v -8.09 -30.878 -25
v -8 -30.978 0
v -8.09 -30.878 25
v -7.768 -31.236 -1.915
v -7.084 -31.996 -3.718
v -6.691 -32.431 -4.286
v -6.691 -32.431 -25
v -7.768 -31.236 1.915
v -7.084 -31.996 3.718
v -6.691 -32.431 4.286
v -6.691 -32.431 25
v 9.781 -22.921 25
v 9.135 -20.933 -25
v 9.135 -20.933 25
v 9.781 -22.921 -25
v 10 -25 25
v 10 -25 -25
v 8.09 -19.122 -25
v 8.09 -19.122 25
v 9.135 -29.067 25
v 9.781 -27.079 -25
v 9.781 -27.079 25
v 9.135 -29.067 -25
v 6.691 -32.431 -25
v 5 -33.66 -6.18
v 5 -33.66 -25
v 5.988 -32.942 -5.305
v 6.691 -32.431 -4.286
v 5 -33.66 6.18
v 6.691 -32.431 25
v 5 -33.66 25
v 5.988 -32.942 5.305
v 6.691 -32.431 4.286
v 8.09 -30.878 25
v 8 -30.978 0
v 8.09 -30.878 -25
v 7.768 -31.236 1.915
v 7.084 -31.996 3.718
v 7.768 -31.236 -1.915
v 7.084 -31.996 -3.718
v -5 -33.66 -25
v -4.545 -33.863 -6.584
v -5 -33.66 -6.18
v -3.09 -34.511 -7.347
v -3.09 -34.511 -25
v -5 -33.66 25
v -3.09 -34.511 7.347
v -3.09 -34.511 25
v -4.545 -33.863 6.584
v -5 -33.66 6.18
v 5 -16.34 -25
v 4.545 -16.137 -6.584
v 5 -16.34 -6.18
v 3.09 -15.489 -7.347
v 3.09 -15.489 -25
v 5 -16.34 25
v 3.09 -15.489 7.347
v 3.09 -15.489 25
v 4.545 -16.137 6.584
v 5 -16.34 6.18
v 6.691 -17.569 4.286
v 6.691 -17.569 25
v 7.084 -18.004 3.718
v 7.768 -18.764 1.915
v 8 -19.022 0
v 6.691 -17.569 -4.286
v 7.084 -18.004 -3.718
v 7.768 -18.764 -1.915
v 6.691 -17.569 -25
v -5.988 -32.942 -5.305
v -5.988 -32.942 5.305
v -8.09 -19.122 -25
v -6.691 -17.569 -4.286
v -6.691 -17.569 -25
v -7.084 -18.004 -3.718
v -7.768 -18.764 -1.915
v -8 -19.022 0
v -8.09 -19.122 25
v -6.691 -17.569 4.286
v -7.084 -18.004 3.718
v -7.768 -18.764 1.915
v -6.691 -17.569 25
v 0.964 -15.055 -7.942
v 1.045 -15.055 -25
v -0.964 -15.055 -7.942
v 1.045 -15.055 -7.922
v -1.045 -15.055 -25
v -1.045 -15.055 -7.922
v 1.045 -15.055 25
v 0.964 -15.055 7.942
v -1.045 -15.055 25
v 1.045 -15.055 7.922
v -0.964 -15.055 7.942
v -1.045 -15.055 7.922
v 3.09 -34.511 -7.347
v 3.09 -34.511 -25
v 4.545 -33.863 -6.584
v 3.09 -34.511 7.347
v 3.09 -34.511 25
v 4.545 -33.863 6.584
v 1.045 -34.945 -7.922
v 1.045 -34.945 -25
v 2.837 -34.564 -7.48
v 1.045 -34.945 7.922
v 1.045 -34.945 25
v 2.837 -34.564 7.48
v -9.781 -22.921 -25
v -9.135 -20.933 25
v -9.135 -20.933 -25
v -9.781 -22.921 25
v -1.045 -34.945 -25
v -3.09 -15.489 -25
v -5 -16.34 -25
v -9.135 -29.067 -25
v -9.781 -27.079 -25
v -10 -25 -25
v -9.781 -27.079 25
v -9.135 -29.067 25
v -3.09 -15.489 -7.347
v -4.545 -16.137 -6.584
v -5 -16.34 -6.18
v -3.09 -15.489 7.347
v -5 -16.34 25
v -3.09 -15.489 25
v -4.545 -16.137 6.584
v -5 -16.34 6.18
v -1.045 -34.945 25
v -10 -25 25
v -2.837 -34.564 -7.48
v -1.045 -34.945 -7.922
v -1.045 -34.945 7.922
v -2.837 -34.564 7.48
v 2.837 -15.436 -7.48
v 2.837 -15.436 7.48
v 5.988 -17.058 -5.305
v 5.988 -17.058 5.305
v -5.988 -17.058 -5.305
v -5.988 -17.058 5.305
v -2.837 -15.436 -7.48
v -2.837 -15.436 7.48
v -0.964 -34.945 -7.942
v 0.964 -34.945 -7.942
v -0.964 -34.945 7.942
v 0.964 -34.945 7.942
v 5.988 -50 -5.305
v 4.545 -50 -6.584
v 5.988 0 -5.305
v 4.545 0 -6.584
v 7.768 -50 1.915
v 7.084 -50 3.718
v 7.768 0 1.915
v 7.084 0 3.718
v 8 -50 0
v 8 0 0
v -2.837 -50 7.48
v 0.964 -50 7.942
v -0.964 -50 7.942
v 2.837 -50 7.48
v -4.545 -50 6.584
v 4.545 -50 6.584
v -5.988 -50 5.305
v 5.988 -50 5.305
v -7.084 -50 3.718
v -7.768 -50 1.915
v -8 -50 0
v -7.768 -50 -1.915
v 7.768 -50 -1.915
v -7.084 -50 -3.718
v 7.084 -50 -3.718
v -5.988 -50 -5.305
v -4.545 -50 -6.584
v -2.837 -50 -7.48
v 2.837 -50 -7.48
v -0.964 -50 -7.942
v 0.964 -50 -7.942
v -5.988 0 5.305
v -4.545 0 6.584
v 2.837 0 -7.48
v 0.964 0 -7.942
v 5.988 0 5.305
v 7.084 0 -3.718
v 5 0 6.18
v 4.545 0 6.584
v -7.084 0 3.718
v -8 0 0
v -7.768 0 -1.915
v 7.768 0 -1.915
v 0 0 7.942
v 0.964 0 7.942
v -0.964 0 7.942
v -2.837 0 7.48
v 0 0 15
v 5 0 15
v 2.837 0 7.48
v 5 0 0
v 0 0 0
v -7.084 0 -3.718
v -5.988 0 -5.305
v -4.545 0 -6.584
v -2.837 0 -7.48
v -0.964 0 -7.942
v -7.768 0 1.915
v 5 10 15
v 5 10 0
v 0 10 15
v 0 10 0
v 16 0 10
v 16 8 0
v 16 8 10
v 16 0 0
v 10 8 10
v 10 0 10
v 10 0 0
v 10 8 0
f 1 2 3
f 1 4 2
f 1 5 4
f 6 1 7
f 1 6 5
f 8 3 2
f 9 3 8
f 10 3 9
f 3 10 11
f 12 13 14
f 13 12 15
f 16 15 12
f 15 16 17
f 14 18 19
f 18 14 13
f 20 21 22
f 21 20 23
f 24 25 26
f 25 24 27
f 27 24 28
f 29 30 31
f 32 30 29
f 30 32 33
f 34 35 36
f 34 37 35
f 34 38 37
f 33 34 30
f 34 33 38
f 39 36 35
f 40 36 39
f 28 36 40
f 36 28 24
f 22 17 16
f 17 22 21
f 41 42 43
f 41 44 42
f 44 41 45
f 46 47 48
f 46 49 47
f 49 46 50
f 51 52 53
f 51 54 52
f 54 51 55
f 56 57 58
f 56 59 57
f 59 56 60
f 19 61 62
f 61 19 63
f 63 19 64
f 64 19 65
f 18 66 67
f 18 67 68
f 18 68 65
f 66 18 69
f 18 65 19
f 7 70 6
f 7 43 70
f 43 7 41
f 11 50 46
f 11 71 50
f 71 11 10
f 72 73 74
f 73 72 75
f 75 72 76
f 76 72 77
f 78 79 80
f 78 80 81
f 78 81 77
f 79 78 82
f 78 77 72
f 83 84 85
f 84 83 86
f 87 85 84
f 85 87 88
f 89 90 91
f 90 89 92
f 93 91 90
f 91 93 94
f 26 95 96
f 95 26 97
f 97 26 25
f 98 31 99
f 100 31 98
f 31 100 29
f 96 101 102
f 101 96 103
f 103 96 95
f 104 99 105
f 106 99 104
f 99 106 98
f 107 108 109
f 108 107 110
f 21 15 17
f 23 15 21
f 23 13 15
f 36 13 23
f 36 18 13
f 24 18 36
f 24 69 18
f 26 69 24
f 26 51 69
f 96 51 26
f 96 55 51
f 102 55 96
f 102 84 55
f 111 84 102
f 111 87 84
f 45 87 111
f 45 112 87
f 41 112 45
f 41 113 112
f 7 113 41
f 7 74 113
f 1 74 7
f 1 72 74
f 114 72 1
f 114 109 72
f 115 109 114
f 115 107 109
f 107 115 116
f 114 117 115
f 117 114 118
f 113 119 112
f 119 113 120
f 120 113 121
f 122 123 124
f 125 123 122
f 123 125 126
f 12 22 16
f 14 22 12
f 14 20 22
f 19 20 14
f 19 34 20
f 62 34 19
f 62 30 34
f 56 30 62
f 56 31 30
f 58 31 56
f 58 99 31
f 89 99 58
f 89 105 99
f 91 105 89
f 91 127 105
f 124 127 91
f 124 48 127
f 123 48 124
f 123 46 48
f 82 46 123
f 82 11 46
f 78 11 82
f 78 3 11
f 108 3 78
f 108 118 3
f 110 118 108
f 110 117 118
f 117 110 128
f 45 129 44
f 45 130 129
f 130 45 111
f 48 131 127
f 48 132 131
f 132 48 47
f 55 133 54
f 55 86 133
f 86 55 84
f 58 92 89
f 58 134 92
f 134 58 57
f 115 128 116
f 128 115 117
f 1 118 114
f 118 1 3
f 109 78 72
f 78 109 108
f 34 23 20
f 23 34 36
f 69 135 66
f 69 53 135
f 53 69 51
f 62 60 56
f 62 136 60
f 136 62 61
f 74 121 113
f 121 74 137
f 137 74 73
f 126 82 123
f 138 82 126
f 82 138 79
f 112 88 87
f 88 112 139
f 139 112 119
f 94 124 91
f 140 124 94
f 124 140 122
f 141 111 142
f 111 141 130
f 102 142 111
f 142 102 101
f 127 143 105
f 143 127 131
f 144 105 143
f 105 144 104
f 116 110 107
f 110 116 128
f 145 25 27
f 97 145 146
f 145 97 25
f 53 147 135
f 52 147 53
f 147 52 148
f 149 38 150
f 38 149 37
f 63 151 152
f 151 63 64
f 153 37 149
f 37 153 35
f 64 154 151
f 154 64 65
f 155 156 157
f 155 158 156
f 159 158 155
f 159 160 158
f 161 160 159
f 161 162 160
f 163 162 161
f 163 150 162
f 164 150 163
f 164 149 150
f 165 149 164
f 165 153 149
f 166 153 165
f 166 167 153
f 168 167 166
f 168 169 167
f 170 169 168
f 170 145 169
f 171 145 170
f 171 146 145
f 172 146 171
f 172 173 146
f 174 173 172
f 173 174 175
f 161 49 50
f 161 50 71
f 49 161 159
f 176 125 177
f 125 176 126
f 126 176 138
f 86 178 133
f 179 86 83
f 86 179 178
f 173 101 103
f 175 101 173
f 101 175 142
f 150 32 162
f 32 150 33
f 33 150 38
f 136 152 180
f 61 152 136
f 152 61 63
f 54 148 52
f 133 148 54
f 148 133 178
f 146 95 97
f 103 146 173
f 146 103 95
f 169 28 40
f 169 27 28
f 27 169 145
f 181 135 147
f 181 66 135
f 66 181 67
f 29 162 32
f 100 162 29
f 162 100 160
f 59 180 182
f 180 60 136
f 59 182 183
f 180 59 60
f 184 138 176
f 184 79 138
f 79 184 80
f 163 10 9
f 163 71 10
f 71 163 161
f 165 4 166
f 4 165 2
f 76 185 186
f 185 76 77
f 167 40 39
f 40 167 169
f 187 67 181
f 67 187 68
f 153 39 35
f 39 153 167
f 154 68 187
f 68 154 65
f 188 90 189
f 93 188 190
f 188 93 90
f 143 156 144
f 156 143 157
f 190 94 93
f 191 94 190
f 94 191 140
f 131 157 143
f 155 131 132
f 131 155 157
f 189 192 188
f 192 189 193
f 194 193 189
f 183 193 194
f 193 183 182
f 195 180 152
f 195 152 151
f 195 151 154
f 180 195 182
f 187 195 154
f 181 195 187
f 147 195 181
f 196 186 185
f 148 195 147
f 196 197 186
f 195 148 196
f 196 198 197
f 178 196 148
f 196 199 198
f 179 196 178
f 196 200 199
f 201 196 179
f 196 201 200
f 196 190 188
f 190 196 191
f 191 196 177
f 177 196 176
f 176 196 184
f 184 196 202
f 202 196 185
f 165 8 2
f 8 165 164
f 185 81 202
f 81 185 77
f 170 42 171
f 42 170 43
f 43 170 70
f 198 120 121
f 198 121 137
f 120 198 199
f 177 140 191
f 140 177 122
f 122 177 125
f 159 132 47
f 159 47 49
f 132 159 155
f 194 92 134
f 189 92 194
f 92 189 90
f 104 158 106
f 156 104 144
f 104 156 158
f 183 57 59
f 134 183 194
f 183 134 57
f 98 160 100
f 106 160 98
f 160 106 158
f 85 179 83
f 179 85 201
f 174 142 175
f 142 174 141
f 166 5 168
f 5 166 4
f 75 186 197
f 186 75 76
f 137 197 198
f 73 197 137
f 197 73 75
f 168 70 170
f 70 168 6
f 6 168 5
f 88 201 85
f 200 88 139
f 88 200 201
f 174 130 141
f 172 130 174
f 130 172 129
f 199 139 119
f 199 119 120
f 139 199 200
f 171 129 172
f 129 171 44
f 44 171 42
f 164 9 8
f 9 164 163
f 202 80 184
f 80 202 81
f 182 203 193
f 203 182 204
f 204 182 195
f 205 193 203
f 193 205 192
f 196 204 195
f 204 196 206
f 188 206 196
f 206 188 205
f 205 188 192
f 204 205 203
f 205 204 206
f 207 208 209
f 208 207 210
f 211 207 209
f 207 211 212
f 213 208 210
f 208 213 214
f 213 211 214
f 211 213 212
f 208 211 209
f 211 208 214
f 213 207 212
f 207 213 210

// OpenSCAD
//translate([0,-25,-25]) cylinder(50,10,10);

//rotate([90,0,0]) cylinder(50,8,8);

*difference()
{
translate([0,-25,-25]) cylinder(50,10,10);
rotate([90,0,0]) cylinder(50,8,8);
}

#intersection()
{
translate([0,-25,-25]) cylinder(50,10,10);
rotate([90,0,0]) cylinder(50,8,8);
}

union()
{
translate([0,-25,-25]) cylinder(50,10,10);
rotate([90,0,0]) cylinder(50,8,8);
}

module box()
{
cube([5,10,15]);
}

box();

module wackybox(width)
{
cube([width, width + 2, width + 4]);
}
wackybox(3);
translate([10,0,0]) wackybox(6);
